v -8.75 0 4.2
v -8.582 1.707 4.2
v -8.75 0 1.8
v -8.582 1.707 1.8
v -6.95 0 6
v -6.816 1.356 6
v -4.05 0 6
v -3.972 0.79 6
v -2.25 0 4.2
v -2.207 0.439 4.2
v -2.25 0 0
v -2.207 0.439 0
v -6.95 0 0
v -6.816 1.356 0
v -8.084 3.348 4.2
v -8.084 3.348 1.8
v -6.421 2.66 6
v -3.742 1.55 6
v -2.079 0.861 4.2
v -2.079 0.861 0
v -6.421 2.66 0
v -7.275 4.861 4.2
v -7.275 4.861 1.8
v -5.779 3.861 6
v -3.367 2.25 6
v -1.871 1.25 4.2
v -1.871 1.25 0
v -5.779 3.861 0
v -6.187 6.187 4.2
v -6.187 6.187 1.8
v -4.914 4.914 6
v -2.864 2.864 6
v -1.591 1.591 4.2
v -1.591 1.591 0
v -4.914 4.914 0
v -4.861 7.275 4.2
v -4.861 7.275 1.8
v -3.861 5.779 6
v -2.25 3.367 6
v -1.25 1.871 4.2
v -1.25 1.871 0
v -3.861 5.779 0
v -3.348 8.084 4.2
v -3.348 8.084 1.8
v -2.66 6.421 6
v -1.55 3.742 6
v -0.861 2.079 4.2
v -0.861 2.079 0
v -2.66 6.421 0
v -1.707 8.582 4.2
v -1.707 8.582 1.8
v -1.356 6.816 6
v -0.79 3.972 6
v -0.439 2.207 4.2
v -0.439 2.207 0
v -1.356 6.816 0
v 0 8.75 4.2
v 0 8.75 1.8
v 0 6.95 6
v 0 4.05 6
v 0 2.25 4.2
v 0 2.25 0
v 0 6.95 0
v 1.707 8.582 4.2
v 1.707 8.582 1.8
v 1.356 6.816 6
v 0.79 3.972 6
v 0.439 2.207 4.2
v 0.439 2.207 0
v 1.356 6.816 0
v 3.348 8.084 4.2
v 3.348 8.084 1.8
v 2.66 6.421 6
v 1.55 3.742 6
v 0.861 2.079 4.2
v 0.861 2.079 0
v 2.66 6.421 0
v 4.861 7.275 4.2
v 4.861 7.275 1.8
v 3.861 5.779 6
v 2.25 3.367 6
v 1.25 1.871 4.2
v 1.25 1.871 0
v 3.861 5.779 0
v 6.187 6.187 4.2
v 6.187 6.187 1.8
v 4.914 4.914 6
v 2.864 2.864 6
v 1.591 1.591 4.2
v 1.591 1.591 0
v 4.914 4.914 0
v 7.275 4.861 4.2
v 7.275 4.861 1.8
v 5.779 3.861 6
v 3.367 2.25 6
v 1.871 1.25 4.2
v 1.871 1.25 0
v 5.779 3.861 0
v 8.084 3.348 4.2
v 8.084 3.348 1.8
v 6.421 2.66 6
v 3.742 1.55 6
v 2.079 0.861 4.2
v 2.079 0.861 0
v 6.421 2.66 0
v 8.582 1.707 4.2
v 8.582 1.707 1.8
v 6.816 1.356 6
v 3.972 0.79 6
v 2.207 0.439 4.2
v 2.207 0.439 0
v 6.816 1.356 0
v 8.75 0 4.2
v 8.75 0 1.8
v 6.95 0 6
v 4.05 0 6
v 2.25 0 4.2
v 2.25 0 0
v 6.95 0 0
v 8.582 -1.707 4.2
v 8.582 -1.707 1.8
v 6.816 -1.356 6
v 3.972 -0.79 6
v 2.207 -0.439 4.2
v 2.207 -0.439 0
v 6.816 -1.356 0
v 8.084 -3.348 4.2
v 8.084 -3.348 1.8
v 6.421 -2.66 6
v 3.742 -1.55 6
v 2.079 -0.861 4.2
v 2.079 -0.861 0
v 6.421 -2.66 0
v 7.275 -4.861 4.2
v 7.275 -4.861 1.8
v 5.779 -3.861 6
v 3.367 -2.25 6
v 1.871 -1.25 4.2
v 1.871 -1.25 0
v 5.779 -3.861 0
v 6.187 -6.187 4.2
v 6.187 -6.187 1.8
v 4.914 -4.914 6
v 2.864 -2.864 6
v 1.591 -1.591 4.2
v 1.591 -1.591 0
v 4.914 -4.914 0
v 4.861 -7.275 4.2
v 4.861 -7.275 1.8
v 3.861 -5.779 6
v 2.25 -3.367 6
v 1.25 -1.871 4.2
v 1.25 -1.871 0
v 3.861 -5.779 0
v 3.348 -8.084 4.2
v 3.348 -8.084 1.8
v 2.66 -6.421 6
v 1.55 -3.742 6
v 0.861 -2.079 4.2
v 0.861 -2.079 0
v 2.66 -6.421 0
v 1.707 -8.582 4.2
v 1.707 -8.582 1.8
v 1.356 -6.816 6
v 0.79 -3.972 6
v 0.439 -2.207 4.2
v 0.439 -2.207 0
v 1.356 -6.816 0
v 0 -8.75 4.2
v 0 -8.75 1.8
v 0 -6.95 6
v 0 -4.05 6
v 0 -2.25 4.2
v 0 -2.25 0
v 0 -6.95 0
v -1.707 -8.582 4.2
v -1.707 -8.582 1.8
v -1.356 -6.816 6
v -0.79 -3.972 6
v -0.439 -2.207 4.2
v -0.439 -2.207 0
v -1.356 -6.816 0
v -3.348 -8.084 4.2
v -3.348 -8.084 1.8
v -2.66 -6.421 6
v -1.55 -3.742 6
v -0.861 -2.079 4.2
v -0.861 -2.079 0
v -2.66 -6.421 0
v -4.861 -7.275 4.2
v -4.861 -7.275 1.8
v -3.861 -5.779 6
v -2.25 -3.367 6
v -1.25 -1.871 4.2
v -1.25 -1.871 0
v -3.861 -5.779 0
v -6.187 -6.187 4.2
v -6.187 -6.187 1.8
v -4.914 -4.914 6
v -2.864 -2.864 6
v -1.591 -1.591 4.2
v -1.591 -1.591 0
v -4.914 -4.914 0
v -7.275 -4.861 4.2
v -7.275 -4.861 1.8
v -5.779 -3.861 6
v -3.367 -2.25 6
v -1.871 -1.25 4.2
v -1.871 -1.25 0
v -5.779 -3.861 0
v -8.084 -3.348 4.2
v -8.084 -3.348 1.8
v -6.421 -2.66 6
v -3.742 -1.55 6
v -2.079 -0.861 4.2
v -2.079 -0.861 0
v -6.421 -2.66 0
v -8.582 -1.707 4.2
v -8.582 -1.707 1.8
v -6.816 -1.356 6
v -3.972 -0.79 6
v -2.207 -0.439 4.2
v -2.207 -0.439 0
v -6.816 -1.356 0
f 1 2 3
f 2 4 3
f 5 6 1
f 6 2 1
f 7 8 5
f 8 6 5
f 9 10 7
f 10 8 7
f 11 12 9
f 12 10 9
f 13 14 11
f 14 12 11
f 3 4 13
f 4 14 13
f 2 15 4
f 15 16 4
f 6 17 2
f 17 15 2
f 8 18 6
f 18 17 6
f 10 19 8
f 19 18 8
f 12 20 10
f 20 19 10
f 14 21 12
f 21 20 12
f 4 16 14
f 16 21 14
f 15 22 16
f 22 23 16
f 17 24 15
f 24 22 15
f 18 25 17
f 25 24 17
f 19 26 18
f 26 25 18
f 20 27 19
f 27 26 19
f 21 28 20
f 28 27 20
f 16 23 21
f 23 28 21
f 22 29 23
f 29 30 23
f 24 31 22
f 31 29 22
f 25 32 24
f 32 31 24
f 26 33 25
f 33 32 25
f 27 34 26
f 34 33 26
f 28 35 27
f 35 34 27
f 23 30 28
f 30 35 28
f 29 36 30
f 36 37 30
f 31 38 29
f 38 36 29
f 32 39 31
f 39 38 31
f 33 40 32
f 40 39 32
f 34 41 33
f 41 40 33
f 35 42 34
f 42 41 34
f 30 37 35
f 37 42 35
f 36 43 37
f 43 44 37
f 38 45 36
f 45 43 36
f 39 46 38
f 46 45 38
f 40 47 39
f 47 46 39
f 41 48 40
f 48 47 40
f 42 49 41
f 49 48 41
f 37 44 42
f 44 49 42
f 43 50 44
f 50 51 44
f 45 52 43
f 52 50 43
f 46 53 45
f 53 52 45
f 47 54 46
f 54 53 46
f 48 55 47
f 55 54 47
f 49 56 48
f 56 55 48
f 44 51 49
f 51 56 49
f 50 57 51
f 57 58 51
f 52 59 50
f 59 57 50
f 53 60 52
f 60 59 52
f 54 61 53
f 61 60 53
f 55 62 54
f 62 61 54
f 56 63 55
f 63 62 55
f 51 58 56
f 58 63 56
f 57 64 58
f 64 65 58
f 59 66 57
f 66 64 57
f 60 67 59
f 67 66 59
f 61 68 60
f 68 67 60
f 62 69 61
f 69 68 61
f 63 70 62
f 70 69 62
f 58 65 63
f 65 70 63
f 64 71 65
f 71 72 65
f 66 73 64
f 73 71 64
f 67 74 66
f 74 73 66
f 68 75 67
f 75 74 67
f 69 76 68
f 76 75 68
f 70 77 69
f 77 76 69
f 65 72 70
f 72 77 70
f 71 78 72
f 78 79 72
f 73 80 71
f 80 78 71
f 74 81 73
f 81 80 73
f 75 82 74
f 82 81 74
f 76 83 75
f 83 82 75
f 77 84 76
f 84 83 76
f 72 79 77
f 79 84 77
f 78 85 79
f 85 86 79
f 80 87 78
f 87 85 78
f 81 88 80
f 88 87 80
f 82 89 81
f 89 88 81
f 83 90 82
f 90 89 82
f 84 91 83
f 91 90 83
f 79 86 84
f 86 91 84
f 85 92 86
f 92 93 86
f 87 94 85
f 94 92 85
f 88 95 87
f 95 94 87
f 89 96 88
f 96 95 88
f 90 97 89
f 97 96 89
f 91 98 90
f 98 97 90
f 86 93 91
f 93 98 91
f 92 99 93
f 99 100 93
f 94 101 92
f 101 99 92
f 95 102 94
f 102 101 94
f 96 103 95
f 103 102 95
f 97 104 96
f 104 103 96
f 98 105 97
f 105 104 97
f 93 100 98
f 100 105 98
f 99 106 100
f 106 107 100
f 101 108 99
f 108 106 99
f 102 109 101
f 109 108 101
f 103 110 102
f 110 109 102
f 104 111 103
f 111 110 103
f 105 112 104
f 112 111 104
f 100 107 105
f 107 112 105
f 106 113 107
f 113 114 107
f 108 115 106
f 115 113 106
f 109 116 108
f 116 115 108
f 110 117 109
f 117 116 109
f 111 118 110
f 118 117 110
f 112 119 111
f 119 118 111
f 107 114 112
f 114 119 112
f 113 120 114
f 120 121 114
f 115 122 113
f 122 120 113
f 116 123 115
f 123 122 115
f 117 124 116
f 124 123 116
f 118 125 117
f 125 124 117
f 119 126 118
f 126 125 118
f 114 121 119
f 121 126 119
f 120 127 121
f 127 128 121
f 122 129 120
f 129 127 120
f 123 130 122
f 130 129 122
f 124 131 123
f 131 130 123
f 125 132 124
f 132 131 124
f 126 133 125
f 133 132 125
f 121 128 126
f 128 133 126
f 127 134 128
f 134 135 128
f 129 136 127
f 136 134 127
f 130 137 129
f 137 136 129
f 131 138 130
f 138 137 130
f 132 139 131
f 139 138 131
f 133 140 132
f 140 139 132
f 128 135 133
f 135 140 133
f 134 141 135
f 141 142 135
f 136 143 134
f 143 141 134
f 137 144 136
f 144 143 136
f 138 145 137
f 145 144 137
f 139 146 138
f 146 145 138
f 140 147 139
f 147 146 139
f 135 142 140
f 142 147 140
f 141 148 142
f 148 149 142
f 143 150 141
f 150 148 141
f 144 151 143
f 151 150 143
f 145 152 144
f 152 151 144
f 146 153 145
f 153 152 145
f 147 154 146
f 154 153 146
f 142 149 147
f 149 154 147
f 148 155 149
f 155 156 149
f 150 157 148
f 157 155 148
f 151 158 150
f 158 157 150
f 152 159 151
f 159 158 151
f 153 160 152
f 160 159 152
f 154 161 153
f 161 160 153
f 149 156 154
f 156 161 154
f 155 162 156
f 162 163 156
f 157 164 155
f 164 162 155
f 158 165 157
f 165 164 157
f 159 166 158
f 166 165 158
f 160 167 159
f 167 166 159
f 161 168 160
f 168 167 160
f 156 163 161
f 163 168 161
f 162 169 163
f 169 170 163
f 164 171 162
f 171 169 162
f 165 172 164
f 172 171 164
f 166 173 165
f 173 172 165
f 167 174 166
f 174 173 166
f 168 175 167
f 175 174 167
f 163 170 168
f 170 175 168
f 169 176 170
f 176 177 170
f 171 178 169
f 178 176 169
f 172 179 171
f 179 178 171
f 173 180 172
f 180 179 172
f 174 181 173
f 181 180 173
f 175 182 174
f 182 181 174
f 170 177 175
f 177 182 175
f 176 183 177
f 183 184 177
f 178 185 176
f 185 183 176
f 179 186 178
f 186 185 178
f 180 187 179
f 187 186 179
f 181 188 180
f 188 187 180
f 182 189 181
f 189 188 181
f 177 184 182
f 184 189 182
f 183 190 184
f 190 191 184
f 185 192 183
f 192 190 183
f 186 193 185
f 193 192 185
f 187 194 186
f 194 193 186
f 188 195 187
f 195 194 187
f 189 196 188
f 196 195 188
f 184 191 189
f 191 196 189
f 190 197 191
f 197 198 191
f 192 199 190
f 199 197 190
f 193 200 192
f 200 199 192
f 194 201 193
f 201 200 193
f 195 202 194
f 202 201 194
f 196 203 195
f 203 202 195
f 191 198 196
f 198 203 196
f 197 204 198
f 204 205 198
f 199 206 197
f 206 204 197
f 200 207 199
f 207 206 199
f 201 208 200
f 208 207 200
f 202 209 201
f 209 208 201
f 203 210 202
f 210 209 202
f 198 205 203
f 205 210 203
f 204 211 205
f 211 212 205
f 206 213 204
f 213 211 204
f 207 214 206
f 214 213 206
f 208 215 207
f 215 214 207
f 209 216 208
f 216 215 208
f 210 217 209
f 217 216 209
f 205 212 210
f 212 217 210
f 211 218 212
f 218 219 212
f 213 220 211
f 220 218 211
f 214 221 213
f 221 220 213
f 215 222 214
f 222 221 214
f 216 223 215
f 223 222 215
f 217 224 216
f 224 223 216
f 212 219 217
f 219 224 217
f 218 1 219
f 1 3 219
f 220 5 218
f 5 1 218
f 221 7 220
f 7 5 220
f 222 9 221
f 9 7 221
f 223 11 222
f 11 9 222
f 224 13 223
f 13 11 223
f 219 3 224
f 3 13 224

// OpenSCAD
$fn = 32;

// ----------------------------------------------------------------------
// Form washer: chamfered washer, 17.5 mm outside, 4.5 mm bore
// ----------------------------------------------------------------------

// --- parameters (mm) ---
revolve_angle = 360;      // full turn around the Z axis
profile_points = 7;       // points of the closed outline

profile = [[2.25, 0], [6.95, 0], [8.75, 1.8], [8.75, 4.2], [6.95, 6], [4.05, 6], [2.25, 4.2]];  // single closed polygon, 7 points, counter clockwise

// --- the one profile operation ---
rotate_extrude(angle = revolve_angle) polygon(points = profile);
